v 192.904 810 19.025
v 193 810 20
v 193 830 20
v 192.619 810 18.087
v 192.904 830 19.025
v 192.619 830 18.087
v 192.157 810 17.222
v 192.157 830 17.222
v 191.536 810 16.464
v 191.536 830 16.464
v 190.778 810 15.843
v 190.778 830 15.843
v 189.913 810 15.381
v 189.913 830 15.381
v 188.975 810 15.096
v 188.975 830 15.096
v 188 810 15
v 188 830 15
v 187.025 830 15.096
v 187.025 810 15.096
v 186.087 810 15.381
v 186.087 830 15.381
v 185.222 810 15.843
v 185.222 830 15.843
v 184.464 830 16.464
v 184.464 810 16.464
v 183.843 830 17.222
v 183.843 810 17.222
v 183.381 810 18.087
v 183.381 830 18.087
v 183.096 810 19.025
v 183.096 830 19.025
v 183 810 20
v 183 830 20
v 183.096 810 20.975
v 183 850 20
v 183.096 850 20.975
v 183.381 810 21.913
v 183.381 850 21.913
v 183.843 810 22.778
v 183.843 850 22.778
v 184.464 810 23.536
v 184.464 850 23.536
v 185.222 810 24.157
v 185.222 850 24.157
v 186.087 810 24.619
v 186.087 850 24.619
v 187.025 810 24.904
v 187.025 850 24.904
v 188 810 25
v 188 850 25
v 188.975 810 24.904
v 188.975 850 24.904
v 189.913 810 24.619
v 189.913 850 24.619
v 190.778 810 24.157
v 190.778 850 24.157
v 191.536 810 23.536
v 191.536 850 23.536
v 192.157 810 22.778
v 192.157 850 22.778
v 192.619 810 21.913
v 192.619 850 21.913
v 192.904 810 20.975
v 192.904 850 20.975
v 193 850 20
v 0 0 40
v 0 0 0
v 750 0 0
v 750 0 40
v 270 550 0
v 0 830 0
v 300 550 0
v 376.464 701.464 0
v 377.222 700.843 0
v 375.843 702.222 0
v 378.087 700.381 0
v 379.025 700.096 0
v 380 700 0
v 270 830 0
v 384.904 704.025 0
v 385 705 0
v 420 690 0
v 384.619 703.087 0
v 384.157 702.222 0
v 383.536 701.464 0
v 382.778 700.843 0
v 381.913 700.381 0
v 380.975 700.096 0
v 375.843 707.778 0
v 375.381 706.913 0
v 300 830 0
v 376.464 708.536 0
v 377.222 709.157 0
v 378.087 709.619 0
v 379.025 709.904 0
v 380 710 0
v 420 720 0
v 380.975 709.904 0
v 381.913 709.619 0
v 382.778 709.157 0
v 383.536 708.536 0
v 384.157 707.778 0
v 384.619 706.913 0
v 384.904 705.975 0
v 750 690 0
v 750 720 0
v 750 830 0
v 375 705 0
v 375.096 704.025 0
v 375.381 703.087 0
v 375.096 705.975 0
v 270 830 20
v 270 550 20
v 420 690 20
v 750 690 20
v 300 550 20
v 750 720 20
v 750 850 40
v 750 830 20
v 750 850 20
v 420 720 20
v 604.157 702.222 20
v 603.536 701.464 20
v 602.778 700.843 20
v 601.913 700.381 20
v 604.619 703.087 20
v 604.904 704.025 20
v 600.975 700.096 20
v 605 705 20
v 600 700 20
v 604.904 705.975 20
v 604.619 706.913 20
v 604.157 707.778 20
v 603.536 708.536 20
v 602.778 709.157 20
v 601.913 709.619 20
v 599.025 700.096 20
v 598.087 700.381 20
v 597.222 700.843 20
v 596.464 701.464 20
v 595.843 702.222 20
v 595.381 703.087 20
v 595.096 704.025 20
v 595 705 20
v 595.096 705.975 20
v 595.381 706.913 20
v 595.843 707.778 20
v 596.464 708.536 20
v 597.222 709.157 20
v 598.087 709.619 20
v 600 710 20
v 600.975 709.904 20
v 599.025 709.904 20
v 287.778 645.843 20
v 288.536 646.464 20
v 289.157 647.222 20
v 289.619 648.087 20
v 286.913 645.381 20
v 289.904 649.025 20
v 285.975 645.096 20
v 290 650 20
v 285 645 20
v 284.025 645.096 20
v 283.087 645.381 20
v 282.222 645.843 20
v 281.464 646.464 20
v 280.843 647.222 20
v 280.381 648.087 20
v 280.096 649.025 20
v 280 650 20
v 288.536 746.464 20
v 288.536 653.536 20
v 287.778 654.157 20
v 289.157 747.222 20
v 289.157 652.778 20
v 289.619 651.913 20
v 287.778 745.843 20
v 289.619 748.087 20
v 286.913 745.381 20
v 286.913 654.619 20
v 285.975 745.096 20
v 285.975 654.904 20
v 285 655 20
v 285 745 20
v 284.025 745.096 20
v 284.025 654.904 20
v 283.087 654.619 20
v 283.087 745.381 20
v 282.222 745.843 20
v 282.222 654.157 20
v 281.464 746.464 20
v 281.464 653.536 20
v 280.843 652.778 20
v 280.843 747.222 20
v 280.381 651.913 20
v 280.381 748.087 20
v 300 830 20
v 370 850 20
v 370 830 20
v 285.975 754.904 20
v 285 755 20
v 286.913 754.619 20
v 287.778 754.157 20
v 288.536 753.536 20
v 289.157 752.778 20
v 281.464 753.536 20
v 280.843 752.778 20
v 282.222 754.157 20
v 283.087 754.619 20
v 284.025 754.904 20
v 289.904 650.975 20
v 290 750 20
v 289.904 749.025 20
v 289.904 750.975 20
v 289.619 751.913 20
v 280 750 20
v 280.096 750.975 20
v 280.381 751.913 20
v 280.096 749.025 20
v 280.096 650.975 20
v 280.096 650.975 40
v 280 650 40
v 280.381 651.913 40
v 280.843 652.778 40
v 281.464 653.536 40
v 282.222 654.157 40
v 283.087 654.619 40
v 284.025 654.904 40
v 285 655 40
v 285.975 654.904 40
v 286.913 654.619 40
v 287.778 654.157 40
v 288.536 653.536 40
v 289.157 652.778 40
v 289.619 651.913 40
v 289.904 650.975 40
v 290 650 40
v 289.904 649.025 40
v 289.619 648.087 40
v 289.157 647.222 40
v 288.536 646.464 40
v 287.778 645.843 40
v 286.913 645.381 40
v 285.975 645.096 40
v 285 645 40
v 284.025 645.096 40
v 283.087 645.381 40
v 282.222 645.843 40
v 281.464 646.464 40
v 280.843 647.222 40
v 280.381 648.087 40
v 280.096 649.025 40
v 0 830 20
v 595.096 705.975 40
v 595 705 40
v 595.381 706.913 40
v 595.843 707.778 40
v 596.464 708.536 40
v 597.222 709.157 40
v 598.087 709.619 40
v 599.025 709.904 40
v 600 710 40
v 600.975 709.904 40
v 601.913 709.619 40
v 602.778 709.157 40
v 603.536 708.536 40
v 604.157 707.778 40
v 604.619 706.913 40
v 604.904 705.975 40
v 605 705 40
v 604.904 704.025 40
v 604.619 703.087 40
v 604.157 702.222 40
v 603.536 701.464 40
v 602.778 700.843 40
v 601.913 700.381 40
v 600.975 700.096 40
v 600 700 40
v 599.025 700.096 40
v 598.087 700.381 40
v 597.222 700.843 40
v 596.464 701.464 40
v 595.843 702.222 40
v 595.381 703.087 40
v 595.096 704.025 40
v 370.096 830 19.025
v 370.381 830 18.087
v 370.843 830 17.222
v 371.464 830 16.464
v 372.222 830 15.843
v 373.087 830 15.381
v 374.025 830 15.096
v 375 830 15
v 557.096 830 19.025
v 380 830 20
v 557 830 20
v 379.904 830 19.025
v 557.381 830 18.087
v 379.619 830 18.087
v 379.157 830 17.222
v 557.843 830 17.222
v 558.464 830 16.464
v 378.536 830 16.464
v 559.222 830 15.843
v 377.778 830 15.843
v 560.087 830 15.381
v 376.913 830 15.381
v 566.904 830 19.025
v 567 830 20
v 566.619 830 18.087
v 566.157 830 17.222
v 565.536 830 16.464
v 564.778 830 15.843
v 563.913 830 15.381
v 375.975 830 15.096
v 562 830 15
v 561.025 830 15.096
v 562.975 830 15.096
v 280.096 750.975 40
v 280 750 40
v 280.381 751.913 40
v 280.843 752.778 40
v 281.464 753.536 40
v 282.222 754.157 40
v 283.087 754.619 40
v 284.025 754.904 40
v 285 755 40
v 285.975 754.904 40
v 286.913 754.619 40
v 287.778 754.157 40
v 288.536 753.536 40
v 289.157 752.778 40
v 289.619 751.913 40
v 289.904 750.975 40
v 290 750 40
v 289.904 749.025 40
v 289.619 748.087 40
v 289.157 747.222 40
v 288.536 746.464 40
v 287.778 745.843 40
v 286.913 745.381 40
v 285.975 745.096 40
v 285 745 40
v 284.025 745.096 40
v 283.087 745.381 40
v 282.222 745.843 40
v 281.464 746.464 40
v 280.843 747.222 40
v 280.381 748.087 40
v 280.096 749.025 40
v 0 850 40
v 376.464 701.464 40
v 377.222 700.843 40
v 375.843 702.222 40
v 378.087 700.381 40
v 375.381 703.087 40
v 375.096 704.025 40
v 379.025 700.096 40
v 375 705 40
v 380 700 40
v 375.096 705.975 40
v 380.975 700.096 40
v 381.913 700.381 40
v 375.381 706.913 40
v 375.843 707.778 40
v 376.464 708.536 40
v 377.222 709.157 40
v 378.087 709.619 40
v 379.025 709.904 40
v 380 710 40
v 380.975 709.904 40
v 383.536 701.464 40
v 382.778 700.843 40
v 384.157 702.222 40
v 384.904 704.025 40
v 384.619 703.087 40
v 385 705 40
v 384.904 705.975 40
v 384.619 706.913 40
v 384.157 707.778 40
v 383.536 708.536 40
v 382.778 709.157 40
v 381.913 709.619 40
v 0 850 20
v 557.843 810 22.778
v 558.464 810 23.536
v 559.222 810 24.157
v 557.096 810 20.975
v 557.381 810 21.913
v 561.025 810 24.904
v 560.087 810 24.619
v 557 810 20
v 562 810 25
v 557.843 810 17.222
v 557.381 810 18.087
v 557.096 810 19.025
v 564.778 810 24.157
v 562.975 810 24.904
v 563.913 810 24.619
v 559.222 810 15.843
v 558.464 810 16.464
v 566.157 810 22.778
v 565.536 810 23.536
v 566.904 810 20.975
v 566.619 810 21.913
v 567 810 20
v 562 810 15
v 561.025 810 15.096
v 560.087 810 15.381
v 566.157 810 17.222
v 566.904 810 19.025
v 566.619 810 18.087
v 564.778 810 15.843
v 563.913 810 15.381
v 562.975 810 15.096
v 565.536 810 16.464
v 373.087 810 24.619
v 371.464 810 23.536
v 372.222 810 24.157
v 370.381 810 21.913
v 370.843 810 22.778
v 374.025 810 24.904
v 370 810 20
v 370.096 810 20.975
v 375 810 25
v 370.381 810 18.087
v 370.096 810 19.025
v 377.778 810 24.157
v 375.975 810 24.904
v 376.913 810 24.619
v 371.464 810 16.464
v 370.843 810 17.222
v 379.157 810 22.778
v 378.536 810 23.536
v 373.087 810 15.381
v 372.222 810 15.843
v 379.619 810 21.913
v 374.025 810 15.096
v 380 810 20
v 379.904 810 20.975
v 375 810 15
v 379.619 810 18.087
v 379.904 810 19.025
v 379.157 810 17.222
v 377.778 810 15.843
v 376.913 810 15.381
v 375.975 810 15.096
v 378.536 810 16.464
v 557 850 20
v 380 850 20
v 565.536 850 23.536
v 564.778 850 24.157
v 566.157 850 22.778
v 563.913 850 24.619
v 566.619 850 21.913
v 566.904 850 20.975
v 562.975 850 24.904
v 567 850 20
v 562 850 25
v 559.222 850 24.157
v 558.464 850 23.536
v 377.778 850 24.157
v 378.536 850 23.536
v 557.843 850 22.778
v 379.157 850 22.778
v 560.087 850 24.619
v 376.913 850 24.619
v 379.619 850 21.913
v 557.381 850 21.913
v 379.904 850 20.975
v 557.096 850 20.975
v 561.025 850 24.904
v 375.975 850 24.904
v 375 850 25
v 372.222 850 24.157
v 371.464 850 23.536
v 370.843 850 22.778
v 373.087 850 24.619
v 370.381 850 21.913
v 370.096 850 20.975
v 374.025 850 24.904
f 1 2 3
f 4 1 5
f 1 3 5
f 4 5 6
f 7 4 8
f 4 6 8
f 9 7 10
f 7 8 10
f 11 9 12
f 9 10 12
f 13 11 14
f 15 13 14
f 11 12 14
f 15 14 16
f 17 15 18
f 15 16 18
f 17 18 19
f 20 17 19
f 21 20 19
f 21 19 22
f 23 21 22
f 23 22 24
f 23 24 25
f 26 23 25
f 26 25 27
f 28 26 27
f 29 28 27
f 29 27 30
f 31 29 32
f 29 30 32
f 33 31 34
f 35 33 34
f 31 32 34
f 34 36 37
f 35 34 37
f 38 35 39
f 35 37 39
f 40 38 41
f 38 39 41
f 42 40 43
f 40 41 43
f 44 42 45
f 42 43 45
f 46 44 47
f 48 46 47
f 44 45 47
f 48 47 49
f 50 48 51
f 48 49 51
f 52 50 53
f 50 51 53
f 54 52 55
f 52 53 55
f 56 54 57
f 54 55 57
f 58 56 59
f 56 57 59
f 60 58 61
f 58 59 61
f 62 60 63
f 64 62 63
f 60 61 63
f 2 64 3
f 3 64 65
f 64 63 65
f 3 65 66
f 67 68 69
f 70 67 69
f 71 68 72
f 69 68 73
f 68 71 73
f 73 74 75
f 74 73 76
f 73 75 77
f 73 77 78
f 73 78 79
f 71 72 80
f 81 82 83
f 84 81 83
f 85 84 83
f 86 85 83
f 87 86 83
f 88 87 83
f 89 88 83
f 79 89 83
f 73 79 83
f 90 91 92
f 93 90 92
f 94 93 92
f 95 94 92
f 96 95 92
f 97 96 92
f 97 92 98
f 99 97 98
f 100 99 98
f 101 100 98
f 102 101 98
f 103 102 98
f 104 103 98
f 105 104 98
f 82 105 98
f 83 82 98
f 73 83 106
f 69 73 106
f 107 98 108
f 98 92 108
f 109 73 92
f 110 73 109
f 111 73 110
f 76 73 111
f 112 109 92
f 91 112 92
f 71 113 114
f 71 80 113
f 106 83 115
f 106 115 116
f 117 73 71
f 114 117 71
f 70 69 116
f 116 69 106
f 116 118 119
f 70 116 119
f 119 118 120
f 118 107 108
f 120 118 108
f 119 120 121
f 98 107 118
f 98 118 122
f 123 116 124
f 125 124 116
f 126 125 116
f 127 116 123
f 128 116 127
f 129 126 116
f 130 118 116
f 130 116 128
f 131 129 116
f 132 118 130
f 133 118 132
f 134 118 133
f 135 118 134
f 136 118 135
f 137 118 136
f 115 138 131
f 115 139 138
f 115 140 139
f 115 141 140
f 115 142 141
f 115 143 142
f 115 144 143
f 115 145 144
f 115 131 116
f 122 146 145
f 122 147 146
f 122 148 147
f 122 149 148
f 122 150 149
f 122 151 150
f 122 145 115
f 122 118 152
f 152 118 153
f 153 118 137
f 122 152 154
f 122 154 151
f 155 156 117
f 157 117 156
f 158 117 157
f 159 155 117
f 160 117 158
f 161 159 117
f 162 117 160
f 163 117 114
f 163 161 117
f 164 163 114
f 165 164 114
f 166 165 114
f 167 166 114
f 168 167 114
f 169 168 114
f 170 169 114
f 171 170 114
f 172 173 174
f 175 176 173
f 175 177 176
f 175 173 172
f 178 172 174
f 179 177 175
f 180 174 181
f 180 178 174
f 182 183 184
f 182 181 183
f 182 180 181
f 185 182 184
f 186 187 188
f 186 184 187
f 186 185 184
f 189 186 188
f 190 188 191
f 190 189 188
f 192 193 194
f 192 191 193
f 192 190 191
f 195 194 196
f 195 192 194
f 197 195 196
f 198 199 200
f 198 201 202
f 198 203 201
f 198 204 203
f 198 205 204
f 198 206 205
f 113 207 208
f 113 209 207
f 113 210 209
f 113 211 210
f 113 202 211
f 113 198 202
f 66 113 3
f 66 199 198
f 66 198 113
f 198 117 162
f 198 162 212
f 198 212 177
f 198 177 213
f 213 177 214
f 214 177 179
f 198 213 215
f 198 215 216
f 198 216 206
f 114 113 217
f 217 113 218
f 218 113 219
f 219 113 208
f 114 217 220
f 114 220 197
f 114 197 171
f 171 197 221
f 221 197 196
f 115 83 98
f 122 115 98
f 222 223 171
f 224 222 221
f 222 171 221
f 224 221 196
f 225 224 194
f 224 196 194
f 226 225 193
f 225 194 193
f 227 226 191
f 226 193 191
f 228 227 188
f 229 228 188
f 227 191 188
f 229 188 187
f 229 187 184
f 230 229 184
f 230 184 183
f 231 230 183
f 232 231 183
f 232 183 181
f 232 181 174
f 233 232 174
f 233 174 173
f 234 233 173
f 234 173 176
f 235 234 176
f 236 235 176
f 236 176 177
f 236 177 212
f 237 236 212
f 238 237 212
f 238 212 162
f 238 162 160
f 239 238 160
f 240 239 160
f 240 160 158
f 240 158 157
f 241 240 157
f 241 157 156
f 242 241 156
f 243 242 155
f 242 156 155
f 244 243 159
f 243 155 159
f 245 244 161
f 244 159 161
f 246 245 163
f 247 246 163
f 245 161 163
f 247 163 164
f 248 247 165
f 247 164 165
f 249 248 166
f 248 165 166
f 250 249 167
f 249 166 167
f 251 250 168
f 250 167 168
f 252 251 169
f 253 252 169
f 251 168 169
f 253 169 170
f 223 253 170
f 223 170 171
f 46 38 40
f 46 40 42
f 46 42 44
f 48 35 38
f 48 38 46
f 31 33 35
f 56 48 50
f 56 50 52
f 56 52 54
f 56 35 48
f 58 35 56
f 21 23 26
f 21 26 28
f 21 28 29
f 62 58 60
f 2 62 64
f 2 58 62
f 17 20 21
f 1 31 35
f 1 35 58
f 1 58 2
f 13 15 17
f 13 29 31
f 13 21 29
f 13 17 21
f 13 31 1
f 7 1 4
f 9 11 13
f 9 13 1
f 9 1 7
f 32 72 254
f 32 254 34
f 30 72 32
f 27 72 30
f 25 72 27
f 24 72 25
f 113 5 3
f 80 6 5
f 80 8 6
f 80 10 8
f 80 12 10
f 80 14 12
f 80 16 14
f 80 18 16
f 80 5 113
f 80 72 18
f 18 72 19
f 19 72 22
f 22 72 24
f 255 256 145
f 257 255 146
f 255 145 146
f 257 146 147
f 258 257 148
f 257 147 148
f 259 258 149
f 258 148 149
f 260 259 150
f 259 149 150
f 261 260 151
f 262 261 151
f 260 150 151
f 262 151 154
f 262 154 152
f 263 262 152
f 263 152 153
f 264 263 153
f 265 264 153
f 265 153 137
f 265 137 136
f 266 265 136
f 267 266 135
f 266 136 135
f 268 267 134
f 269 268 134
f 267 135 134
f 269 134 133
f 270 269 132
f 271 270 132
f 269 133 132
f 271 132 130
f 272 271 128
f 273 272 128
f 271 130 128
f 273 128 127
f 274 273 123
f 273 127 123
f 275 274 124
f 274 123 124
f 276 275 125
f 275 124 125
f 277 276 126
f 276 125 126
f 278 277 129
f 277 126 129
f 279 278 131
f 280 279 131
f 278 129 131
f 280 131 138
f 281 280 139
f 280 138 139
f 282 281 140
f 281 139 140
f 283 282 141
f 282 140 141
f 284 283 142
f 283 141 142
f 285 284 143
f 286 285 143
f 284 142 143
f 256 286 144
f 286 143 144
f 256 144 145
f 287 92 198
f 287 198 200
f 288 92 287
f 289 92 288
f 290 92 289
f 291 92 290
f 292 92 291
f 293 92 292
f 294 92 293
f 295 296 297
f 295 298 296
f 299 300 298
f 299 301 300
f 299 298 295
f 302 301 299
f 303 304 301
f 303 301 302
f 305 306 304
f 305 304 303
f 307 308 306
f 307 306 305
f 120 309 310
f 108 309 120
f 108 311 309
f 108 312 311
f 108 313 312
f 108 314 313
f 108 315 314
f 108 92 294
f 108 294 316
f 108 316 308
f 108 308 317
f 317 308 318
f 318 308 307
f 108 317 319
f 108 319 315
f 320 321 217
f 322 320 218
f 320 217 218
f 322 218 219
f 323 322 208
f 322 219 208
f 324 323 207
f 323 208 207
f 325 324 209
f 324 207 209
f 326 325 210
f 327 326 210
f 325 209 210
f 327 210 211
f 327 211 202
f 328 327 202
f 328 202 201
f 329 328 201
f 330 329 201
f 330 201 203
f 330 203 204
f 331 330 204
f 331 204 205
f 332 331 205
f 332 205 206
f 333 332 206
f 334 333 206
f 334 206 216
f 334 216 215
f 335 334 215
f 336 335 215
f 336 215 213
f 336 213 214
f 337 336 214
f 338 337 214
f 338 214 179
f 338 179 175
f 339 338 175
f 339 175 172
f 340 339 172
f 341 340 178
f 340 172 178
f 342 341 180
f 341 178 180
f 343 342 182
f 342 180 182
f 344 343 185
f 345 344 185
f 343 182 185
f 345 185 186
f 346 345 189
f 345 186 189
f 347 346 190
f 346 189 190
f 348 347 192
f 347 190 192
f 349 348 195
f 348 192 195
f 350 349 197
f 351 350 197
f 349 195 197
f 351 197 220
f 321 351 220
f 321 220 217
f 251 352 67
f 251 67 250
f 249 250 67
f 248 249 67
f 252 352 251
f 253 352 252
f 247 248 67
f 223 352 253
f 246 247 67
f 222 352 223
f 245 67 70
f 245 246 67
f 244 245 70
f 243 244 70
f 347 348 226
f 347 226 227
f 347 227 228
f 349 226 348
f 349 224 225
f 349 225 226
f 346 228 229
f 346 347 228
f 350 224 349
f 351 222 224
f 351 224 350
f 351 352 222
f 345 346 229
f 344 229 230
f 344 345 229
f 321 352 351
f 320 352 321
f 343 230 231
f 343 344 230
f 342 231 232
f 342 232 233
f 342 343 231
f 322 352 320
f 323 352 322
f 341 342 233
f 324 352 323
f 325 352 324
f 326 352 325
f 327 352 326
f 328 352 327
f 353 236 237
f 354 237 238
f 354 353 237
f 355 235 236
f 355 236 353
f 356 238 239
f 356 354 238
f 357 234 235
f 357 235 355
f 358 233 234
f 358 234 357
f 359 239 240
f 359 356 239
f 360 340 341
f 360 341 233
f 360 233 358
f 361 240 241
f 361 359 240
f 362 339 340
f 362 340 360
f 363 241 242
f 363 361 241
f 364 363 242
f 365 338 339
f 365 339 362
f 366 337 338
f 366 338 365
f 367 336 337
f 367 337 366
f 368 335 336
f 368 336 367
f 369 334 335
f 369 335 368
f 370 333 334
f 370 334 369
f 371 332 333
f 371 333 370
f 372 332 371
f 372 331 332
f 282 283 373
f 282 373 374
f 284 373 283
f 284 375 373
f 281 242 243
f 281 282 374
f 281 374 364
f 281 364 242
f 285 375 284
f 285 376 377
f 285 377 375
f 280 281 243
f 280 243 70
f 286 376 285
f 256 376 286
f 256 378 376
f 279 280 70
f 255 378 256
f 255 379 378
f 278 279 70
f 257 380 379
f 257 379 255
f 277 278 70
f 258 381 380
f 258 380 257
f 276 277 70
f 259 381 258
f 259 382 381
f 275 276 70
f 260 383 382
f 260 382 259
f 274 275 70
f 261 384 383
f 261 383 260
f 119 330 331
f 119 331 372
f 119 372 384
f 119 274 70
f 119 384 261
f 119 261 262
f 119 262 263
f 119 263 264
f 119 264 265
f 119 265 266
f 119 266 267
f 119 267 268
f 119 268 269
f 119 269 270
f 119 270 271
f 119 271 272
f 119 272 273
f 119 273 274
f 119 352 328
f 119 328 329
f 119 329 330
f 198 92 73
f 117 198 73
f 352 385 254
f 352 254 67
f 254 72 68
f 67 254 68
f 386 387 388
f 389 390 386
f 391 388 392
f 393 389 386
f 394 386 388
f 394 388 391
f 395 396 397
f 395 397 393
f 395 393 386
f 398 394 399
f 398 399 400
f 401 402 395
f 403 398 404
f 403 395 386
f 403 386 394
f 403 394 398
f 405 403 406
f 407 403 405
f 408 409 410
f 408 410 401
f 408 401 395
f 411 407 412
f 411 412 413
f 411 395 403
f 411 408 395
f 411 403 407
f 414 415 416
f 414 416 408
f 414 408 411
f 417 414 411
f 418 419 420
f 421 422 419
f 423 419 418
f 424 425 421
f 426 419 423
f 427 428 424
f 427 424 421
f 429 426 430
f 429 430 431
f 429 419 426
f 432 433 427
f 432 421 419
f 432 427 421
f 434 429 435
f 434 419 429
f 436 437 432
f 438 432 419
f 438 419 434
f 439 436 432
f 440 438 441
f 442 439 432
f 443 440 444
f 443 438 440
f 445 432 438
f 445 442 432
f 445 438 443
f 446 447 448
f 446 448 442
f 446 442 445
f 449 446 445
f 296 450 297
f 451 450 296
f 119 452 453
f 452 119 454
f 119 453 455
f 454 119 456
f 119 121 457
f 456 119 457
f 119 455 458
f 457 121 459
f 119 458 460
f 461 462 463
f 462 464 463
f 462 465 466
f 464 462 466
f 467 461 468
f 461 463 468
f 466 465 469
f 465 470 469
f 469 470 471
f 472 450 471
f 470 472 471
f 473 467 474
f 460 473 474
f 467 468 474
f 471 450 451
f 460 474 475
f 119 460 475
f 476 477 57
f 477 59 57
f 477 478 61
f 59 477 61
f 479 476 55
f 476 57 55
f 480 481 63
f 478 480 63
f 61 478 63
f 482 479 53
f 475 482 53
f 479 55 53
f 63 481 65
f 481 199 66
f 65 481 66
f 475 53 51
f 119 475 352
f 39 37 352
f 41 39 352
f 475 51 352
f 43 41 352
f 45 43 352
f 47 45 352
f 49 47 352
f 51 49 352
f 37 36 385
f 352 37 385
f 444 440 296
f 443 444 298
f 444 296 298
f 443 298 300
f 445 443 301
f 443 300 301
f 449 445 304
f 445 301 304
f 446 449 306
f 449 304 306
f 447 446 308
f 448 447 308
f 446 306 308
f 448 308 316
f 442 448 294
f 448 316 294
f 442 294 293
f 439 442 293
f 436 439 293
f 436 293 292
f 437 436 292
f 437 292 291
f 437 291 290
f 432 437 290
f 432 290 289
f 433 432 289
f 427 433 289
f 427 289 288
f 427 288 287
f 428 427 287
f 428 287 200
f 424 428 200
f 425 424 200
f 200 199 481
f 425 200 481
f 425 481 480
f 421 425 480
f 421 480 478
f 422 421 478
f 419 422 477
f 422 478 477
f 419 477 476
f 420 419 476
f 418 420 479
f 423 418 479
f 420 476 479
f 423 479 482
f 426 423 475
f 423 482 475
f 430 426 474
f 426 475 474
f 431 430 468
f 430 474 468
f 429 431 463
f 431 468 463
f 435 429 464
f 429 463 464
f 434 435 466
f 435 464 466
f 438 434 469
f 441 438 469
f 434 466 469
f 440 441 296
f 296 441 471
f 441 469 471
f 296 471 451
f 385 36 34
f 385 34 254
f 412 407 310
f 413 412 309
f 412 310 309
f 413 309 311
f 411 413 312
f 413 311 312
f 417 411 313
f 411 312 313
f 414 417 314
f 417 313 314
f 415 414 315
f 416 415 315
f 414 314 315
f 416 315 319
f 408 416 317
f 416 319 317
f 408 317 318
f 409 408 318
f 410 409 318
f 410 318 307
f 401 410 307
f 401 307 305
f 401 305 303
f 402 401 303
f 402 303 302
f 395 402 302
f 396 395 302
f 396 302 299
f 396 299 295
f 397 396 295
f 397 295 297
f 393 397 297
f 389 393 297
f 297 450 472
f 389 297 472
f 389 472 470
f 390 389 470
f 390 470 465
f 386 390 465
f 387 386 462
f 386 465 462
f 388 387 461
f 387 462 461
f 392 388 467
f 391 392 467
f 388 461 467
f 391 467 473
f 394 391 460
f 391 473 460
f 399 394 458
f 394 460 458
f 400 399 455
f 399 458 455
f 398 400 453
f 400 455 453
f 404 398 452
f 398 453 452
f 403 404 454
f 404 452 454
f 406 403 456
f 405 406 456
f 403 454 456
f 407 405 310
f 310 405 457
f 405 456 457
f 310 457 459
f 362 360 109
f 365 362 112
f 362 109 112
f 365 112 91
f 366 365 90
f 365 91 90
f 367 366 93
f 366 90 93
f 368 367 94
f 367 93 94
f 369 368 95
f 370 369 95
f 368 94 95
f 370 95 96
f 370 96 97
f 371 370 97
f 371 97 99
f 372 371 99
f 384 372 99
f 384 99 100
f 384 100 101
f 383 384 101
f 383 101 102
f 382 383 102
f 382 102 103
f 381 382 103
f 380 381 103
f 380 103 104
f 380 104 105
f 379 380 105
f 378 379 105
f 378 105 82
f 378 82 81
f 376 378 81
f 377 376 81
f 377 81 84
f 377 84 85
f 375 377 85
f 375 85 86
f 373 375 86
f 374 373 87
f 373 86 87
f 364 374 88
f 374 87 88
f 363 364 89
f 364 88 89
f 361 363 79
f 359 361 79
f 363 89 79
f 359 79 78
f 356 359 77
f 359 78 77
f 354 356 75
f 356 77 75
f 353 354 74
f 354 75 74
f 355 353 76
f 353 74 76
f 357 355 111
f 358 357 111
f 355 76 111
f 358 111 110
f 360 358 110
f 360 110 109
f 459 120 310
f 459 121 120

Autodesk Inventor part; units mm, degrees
ref_plane "YZ Plane" through (0, 0, 0) normal (1, 0, 0) x (0, 1, 0)
ref_plane "XZ Plane" through (0, 0, 0) normal (0, 1, 0) x (-1, 0, 0)
ref_plane "XY Plane" through (0, 0, 0) normal (0, 0, 1) x (1, 0, 0)
sketch "Sketch1" plane through (0, 0, 0) normal (0, 0, 1) x (1, 0, 0)
  line L0 (0, 0) -> (750, 0)
  line L1 (750, 0) -> (750, 850)
  line L2 (750, 850) -> (0, 850)
  line L3 (0, 850) -> (0, 0)
  dimension "d0" = 750
  dimension "d1" = 850
extrude "Extrusion1" add sketch "Sketch1" along normal blind 40
sketch "Sketch2" plane through (0, 850, 0) normal (0, 1, 0) x (1, 0, 0)
  line L0 (750, 0) -> (0, 0) projected
  line L1 (0, 0) -> (750, 0)
  line L2 (750, 0) -> (750, -20)
  line L3 (750, -20) -> (0, -20)
  line L4 (0, -20) -> (0, 0)
  dimension "d4" = 750
  dimension "d5" = 20
extrude "Extrusion2" cut sketch "Sketch2" against normal blind 20
sketch "Sketch3" plane through (0, 850, 40) normal (0, 1, 0) x (1, 0, 0)
  line L0 (0, 20) -> (0, 0) projected
  circle A0 centre (562, 20) radius 5
  circle A1 centre (375, 20) radius 5
  circle A2 centre (188, 20) radius 5
  point P0 (0, 40)
  dimension "d11" = 10
  dimension "d12" = 10
  dimension "d13" = 10
extrude "Extrusion3" cut sketch "Sketch3" against normal blind 40
thread "Thread1" size "M10x1.5" class "6H" standard "ANSI Metric M Profile" full length
thread "Thread2" size "M10x1.5" class "6H" standard "ANSI Metric M Profile" full length
thread "Thread3" size "M10x1.5" class "6H" standard "ANSI Metric M Profile" full length
sketch "Sketch4" plane through (0, 0, 0) normal (0, 0, -1) x (-1, 0, 0)
  line L0 (-750, 720) -> (0, 720)
  line L1 (0, 850) -> (0, 0) projected
  line L2 (-750, 720) -> (0, 720)
  line L3 (0, 720) -> (0, 690)
  line L4 (0, 690) -> (-750, 690)
  line L5 (-750, 690) -> (-750, 720)
  line L6 (0, 690) -> (-420, 690)
  line L7 (-420, 690) -> (-420, 720)
  line L8 (-420, 720) -> (0, 720)
  line L9 (0, 720) -> (0, 690)
  dimension "d23" = 30
  dimension "d24" = 420
  dimension "d25" = 30
extrude "Extrusion4" cut sketch "Sketch4" against normal blind 20 contours L0 L7 L4 L5
sketch "Sketch5" plane through (0, 0, 0) normal (0, 0, -1) x (-1, 0, 0)
  line L0 (-750, 850) -> (0, 850) projected
  line L1 (0, 850) -> (-300, 850)
  line L2 (-300, 850) -> (-300, 550)
  line L3 (-300, 550) -> (0, 550)
  line L4 (0, 550) -> (0, 850)
  line L5 (-300, 850) -> (-270, 850)
  line L6 (-270, 850) -> (-270, 550)
  line L7 (-270, 550) -> (-300, 550)
  line L8 (-300, 550) -> (-300, 850)
  point P0 (0, 0)
  dimension "d28" = 300
  dimension "d29" = 300
  dimension "d30" = 30
extrude "Extrusion5" cut sketch "Sketch5" against normal blind 20 contours L0 L6 L3 L2
sketch "Sketch6" plane through (0, 0, 0) normal (0, 0, -1) x (-1, 0, 0)
  circle A0 centre (-600, 705) radius 5
  circle A1 centre (-380, 705) radius 5
  line L0 (-270, 550) -> (-300, 550) projected
  circle A2 centre (-285, 750) radius 5
  circle A3 centre (-285, 650) radius 5
  point P0 (0, 0)
  point P1 (-750, 690)
  point P2 (-300, 830)
  dimension "d37" = 10
  dimension "d38" = 10
  dimension "d44" = 10
  dimension "d45" = 10
extrude "Extrusion6" cut sketch "Sketch6" against normal blind 81.4375
thread "Thread4" size "M10x1.5" class "6H" standard "ANSI Metric M Profile" full length
thread "Thread5" size "M10x1.5" class "6H" standard "ANSI Metric M Profile" full length
thread "Thread6" size "M10x1.5" class "6H" standard "ANSI Metric M Profile" full length
thread "Thread7" size "M10x1.5" class "6H" standard "ANSI Metric M Profile" full length
properties part number "wall"
